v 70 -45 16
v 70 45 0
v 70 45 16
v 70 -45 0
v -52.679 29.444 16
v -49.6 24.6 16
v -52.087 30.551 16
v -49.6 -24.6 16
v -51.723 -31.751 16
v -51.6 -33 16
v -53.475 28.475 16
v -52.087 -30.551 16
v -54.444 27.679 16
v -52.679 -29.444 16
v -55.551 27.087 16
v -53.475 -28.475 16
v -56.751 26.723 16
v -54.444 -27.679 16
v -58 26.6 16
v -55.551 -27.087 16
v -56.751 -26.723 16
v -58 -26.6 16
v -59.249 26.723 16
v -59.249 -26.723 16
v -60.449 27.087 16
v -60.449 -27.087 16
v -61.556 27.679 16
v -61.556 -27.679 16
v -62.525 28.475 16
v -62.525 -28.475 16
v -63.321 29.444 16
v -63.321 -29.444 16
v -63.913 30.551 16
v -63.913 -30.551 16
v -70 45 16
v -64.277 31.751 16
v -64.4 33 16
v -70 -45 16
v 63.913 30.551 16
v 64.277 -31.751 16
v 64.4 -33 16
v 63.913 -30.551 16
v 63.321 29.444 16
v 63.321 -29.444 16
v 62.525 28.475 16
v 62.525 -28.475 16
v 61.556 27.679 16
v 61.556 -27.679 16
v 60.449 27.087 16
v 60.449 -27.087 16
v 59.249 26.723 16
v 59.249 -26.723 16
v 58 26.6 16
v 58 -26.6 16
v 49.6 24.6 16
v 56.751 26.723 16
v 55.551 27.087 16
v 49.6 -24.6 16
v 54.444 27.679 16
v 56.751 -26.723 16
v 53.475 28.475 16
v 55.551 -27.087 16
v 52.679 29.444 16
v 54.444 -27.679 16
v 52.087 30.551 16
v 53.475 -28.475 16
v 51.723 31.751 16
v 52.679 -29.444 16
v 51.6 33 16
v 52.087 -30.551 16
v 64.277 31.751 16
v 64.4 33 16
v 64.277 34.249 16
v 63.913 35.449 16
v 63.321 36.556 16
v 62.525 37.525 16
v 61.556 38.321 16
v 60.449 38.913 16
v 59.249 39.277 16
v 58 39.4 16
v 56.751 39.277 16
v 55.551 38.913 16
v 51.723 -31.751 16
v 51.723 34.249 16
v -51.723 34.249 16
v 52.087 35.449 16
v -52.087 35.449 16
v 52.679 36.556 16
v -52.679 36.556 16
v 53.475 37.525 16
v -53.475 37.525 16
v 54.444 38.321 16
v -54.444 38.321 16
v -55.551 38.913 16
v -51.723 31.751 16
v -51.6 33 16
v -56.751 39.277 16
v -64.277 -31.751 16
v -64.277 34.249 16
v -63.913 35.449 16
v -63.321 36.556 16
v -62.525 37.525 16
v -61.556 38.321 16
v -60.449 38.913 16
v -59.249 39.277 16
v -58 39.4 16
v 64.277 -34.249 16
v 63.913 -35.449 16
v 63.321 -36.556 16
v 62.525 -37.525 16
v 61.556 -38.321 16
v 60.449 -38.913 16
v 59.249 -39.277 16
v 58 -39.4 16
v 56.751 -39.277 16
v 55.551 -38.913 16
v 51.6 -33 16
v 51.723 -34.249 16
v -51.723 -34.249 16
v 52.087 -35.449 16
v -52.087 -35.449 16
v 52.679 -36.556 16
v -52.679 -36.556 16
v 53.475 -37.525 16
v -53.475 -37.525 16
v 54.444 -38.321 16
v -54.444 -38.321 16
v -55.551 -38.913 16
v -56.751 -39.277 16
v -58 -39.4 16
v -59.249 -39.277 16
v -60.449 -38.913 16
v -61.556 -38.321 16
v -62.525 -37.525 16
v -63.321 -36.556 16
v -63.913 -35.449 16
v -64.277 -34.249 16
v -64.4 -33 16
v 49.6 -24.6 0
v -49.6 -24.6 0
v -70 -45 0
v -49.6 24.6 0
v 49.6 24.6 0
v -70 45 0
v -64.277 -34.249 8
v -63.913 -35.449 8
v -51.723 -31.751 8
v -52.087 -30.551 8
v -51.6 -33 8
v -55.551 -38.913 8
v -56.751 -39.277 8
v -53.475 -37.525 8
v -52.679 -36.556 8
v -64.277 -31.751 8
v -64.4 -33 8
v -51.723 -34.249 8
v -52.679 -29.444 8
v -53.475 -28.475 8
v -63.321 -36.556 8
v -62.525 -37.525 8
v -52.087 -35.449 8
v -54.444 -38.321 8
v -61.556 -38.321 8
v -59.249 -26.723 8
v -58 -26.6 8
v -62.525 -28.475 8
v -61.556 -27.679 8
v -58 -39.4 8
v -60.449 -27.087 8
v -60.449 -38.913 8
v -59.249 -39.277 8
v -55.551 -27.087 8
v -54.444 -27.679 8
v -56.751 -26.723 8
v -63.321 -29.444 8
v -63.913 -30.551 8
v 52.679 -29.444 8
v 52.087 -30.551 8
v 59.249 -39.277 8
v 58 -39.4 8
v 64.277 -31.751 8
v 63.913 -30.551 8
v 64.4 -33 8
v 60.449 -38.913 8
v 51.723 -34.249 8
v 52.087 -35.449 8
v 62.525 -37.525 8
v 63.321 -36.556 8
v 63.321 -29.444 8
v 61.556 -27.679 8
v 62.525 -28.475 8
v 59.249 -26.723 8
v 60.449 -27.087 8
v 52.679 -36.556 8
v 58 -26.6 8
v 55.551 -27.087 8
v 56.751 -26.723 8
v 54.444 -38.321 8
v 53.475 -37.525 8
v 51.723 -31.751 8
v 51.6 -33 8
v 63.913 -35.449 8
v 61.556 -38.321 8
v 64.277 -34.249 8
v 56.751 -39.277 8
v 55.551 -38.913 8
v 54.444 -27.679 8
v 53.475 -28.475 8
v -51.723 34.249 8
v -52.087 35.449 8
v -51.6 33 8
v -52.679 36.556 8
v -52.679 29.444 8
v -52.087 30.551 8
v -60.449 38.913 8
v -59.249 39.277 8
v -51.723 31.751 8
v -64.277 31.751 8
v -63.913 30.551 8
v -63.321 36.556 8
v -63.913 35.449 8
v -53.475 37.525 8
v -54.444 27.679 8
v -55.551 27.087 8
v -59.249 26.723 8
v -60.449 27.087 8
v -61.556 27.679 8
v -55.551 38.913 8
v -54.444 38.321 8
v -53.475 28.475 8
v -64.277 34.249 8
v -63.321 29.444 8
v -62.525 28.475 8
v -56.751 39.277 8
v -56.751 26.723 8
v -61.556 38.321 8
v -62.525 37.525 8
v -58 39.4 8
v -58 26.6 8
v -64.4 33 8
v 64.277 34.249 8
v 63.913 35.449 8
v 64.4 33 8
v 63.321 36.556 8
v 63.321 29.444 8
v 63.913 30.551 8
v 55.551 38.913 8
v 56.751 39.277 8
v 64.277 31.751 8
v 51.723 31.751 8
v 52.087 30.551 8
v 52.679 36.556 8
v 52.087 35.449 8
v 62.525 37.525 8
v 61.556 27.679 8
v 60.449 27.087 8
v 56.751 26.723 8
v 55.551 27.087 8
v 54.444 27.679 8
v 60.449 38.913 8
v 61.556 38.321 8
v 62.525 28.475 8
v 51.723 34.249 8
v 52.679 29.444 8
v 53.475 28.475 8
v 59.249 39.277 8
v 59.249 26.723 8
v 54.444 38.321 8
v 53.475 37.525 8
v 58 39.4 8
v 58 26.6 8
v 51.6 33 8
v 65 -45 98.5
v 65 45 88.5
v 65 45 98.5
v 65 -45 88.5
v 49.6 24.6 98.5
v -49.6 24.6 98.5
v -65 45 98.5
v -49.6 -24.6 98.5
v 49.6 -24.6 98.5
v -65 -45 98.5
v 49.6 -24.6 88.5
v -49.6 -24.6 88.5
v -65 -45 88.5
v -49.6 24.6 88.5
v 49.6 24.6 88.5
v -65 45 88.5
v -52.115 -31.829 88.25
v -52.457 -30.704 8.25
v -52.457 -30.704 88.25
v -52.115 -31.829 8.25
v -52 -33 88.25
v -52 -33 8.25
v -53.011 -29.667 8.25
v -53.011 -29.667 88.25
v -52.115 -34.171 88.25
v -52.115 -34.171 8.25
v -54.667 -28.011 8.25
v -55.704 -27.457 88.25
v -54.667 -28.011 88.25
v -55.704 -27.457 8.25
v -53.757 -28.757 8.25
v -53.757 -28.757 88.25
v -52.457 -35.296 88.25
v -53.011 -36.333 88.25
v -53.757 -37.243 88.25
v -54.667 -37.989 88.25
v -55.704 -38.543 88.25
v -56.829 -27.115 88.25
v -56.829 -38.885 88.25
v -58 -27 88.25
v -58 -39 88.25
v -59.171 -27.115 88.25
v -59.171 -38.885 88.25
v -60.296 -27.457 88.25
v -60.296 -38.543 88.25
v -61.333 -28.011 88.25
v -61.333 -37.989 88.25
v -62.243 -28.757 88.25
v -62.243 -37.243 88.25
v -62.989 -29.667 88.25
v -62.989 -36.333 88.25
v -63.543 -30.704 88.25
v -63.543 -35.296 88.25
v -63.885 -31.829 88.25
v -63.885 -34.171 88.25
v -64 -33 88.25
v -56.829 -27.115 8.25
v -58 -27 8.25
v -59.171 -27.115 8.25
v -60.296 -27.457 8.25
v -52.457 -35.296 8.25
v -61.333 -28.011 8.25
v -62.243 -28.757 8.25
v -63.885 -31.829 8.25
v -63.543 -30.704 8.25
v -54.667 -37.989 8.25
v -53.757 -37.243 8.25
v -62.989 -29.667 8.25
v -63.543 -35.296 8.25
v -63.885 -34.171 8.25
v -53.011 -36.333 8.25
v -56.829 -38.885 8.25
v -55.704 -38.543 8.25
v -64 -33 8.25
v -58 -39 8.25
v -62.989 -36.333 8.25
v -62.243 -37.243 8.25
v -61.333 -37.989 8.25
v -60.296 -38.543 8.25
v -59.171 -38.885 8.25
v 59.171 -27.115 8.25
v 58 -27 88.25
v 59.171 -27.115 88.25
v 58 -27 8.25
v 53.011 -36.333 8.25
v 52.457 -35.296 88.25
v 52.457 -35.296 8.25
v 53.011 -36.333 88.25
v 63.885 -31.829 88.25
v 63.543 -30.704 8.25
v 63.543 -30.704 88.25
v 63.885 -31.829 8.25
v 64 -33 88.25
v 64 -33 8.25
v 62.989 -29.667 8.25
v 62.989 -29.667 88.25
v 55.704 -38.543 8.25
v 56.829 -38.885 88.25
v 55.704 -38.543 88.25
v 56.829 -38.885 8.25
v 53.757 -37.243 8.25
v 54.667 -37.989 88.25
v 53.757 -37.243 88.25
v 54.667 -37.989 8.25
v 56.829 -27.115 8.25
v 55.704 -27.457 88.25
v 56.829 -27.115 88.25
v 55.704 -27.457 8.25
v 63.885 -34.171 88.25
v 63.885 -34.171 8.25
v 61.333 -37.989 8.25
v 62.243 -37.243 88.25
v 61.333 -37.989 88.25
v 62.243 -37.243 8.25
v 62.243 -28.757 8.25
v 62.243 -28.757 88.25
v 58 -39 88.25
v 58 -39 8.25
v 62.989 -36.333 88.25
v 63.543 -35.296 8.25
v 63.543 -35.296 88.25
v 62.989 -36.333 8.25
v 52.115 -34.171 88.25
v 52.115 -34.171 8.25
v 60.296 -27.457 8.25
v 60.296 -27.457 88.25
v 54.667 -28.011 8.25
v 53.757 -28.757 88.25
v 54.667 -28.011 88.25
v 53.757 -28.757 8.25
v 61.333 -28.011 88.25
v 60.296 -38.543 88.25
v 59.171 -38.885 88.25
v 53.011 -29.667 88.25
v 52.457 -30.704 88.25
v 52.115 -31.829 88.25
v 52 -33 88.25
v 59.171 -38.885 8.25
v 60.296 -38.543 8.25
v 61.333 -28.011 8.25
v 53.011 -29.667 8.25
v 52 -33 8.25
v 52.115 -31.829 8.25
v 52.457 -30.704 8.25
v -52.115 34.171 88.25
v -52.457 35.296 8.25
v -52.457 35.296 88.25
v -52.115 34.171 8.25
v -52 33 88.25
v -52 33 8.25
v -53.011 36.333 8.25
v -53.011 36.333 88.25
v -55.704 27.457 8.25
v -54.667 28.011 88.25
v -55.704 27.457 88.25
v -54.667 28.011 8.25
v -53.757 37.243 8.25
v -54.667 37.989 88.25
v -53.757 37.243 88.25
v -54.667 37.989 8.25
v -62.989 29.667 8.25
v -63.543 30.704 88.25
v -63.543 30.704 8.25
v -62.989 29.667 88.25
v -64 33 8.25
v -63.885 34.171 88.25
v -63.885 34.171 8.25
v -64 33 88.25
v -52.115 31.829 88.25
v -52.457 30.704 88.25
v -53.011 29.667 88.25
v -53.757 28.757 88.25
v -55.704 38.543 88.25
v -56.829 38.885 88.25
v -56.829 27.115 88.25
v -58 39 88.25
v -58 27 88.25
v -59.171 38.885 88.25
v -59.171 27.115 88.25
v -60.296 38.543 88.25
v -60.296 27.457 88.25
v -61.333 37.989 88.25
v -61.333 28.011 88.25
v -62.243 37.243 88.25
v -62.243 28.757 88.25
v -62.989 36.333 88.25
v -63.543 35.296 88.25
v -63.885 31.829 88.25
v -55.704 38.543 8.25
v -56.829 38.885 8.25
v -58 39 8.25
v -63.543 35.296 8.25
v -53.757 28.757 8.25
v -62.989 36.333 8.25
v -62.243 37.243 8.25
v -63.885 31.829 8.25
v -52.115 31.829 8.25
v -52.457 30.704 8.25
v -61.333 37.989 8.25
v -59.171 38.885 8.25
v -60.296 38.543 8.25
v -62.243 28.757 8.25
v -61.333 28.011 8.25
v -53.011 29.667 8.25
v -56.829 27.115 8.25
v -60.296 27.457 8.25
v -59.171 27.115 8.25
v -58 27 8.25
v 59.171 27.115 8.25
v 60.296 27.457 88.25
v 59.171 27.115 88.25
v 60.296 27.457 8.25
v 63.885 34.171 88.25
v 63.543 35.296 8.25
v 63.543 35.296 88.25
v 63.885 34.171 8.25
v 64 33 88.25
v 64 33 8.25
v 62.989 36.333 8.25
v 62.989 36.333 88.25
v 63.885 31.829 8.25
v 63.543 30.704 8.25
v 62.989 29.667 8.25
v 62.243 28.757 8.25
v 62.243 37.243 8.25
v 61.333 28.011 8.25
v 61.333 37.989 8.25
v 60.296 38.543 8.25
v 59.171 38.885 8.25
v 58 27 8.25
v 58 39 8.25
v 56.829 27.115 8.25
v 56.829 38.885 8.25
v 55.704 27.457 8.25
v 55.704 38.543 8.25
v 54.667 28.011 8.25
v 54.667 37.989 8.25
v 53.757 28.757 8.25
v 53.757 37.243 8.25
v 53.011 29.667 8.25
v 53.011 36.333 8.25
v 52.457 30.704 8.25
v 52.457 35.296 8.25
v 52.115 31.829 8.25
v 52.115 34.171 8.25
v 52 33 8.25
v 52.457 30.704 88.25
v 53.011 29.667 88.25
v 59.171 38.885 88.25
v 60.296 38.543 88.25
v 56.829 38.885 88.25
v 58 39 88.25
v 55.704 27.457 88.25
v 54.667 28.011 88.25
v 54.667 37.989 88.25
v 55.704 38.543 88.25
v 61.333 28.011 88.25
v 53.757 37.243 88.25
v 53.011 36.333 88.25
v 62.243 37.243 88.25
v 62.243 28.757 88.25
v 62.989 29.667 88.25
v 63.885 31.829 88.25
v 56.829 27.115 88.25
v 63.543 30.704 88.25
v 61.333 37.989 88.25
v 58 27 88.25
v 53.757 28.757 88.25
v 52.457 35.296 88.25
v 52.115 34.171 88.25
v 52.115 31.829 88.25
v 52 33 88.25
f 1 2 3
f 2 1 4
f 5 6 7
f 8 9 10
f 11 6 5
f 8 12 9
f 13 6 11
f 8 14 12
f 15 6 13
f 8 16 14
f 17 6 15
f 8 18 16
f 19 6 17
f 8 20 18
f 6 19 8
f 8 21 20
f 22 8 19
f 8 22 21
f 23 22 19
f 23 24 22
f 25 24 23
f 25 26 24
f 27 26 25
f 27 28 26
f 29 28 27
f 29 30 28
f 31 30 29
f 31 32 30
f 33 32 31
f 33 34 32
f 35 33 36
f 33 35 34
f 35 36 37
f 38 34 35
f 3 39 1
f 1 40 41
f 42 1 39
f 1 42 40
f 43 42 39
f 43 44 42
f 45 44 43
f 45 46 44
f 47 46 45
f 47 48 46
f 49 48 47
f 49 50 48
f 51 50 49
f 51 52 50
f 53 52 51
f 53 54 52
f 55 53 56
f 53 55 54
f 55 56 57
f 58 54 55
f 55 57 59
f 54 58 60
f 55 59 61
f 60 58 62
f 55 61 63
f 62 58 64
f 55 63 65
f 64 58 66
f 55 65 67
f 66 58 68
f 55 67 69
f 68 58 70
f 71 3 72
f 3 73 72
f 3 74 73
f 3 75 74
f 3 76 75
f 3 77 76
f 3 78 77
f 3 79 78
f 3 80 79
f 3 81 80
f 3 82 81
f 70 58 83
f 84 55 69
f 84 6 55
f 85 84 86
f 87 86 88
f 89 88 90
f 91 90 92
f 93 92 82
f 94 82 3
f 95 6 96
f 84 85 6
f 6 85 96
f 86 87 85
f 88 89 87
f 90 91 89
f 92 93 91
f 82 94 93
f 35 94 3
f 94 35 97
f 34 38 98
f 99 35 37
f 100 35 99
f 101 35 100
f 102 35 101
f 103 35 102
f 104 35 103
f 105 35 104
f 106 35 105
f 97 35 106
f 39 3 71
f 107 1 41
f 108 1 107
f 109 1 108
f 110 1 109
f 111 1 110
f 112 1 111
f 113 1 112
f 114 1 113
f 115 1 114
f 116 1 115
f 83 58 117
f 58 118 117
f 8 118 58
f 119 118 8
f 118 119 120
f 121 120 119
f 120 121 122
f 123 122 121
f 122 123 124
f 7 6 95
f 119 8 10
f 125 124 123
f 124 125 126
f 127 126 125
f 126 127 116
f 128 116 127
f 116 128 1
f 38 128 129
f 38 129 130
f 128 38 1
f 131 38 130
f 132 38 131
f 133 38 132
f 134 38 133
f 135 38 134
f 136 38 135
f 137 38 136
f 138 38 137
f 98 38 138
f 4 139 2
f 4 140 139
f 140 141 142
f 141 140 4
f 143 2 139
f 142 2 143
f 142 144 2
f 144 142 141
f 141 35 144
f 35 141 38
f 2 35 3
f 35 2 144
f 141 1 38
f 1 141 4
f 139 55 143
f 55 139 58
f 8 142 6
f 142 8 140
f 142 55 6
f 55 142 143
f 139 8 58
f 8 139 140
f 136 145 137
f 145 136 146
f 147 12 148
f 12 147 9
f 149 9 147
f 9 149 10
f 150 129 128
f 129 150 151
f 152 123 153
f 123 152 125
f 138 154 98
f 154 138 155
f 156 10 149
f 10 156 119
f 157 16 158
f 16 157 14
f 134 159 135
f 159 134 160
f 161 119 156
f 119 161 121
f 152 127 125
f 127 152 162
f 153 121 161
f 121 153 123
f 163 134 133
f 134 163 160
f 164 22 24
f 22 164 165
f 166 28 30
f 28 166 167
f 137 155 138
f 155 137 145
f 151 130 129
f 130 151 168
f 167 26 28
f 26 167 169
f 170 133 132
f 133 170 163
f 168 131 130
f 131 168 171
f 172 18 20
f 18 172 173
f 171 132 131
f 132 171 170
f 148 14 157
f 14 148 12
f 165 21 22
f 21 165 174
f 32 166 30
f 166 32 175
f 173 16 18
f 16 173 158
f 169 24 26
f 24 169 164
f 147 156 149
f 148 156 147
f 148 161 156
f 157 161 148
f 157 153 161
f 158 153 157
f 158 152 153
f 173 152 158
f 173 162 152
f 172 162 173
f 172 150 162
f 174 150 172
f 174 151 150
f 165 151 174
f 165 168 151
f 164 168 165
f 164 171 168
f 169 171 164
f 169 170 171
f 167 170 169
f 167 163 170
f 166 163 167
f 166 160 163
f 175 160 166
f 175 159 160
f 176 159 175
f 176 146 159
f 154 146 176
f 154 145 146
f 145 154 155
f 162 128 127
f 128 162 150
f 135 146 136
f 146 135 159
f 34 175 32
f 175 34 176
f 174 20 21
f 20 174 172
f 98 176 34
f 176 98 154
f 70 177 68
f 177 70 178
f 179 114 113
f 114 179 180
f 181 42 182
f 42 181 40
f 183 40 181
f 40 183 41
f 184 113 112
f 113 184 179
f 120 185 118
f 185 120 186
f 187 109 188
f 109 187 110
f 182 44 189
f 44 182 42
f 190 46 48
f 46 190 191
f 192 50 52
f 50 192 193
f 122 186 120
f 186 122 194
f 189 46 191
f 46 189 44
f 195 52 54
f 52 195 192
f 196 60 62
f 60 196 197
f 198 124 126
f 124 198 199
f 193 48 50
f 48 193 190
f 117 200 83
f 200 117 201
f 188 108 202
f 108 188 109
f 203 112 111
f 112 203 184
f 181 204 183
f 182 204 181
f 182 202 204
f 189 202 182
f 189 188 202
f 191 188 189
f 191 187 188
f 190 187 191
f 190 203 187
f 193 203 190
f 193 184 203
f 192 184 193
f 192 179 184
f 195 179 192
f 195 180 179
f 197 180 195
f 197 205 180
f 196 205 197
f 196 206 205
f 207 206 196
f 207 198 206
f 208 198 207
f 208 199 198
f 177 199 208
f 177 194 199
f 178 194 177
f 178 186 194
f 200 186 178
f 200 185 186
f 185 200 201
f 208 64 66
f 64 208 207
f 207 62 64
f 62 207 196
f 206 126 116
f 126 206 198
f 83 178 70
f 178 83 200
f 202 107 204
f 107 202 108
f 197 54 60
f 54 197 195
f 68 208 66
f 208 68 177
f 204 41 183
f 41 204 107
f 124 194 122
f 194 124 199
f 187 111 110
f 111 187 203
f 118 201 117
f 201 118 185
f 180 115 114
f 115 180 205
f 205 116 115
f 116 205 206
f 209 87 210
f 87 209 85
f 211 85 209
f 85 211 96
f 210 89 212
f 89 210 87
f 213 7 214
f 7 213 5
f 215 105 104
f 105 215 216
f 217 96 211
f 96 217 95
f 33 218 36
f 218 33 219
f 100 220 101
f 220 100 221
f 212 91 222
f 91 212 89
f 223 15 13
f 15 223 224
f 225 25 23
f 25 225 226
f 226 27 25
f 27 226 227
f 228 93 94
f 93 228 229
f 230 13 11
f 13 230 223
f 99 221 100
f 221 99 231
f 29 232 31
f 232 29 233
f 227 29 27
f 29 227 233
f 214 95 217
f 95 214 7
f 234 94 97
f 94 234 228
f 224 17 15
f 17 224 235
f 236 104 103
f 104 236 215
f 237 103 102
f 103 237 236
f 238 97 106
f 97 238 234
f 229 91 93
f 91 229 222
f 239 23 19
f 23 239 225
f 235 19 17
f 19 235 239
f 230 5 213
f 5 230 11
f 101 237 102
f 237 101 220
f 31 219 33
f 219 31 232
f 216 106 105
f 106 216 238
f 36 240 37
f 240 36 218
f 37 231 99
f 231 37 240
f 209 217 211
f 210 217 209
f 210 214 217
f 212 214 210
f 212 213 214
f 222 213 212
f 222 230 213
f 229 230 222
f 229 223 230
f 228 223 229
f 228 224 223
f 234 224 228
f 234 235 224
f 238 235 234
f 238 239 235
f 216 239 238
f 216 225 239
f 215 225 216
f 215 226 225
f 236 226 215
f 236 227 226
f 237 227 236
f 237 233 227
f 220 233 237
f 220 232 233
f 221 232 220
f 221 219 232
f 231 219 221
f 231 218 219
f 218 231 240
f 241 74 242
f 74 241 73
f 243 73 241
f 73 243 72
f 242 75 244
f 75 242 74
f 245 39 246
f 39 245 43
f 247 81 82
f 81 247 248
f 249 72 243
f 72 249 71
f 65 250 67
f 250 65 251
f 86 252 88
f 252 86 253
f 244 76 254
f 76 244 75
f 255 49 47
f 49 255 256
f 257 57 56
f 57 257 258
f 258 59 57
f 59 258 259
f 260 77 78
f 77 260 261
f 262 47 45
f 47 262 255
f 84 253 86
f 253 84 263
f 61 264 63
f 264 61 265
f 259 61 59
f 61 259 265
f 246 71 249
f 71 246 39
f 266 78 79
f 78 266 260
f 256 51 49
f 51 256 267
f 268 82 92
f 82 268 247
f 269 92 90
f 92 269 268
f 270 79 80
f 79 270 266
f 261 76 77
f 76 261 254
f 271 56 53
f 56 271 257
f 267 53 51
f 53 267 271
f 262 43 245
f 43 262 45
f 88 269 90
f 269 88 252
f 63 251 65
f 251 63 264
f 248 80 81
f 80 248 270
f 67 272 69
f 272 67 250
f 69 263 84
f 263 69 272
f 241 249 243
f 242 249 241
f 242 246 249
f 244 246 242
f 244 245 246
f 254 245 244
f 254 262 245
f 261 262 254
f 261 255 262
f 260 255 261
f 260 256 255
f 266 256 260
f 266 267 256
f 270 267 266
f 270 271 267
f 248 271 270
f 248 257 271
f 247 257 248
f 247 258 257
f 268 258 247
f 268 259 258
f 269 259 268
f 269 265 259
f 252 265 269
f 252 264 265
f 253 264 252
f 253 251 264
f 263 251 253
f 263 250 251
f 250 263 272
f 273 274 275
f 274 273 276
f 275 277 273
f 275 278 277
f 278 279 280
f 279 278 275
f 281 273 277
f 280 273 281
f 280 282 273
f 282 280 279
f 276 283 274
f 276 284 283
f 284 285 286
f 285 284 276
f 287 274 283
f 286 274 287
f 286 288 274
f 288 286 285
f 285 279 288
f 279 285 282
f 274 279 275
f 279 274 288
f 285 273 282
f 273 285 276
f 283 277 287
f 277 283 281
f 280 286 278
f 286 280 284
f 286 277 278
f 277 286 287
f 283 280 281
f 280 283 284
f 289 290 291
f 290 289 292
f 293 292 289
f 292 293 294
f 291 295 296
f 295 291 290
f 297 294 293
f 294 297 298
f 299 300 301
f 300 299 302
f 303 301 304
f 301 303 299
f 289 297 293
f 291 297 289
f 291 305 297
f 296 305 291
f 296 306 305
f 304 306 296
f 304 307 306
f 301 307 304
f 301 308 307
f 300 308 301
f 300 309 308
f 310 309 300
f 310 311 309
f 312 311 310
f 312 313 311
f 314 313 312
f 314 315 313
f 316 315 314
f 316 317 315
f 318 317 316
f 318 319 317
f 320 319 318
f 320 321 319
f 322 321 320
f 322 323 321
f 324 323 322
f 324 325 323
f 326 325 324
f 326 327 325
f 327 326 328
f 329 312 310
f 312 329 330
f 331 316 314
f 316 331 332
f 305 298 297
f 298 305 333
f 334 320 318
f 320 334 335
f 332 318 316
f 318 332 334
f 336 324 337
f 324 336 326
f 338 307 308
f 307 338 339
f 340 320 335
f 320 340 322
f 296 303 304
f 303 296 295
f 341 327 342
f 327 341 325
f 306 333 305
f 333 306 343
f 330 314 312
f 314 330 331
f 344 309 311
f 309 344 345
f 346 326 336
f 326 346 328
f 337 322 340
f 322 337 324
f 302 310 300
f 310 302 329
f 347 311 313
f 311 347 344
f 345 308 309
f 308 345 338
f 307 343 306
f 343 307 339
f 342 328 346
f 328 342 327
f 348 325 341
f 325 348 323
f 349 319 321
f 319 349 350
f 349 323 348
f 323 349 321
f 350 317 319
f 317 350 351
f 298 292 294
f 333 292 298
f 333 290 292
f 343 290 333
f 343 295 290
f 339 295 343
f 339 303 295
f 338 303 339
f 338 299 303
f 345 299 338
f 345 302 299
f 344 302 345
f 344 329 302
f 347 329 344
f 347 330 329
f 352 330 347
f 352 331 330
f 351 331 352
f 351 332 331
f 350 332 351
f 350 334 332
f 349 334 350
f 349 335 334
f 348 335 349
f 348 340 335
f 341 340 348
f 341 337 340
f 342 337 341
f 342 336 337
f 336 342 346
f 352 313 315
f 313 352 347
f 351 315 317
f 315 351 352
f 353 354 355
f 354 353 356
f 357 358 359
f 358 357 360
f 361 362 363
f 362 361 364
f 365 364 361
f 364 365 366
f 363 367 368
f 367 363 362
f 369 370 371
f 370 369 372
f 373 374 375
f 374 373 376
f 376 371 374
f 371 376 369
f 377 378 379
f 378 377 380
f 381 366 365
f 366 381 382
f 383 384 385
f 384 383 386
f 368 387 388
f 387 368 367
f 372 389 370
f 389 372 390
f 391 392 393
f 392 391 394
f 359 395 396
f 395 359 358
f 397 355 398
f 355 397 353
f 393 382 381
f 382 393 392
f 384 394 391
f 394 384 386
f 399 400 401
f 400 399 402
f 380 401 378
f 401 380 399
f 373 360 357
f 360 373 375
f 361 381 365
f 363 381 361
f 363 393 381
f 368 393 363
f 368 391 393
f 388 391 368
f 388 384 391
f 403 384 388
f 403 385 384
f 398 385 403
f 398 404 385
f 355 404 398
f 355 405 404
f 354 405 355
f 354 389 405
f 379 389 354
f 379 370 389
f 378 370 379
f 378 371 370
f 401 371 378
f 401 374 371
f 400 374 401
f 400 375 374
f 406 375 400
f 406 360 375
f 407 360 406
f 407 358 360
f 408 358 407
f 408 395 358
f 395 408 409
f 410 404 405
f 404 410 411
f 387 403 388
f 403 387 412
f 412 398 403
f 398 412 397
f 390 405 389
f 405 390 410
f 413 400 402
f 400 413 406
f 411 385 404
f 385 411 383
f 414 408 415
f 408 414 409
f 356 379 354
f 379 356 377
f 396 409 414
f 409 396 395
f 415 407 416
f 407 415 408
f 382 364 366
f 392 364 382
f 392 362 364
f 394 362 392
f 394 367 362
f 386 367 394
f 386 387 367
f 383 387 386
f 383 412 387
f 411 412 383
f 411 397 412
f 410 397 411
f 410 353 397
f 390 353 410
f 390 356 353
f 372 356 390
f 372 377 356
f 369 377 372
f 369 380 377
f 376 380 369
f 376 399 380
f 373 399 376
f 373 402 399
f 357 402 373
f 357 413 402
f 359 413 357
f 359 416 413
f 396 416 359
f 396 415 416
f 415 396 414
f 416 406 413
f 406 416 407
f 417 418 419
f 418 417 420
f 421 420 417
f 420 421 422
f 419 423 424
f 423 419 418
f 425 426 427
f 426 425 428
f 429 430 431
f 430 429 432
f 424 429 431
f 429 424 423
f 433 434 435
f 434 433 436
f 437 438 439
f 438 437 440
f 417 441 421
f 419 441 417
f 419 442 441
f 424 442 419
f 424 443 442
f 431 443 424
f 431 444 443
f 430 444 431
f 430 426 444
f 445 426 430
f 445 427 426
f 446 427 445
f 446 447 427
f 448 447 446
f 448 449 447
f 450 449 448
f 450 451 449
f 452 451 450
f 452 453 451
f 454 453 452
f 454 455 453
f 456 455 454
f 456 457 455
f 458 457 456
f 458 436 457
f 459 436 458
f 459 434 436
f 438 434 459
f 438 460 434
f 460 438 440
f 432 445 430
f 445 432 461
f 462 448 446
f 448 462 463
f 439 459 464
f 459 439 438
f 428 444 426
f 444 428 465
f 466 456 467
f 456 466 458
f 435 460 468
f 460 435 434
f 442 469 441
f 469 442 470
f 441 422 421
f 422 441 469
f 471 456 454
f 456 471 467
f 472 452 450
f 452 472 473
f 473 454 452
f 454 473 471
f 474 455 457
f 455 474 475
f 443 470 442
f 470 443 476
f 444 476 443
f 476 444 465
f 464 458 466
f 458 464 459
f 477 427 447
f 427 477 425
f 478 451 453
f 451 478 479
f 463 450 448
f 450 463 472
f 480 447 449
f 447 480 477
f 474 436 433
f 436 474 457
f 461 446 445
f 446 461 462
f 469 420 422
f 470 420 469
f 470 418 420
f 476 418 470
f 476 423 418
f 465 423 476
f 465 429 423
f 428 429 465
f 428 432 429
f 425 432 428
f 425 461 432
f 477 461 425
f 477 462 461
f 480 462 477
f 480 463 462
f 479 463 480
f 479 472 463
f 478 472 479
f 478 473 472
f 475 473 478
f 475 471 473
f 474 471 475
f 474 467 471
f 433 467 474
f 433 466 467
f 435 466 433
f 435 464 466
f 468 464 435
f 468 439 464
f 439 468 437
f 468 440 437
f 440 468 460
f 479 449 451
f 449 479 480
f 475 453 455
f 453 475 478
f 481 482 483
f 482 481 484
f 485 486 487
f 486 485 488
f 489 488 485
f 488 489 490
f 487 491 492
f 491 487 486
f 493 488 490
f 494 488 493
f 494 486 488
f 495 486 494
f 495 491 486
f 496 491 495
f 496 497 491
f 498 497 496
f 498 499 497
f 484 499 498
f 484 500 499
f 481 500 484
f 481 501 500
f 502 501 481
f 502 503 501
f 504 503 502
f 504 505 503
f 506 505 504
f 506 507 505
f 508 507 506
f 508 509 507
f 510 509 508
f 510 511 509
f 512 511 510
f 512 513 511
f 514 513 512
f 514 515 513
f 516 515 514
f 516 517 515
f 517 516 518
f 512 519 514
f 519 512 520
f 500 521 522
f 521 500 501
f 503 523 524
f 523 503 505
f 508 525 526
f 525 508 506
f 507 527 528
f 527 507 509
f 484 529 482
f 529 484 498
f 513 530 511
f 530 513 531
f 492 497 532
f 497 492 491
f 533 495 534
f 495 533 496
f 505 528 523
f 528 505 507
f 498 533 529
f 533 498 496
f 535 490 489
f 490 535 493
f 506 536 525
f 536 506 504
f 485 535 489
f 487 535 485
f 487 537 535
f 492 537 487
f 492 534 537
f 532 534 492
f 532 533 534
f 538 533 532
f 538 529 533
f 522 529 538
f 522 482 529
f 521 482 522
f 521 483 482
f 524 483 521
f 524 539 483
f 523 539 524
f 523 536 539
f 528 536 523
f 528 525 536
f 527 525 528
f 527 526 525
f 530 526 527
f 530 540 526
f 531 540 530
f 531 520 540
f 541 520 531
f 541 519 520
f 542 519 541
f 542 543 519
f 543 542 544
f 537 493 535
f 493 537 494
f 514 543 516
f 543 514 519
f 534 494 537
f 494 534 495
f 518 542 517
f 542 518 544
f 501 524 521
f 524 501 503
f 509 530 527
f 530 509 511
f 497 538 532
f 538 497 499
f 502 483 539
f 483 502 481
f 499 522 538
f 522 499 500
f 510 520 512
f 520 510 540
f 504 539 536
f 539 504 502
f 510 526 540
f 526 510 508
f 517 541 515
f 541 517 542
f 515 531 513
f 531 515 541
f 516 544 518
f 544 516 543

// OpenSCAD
$fn = 32;

// ------------------------------------------------------------------------
// Frame cube: base 140 x 90 mm, posts 80 mm tall
// Every part is its own module, assembly() places every instance.
// ------------------------------------------------------------------------

// --- part 1 ---
module base_frame() {
  difference() {
    translate([-70, -45, 0]) cube([140, 90, 16]);
    translate([-49.6, -24.6, -1]) cube([99.2, 49.2, 18]);
    translate([-58, -33, 8]) cylinder(h = 9, d = 12.8);
    translate([58, -33, 8]) cylinder(h = 9, d = 12.8);
    translate([-58, 33, 8]) cylinder(h = 9, d = 12.8);
    translate([58, 33, 8]) cylinder(h = 9, d = 12.8);
  }
}

// --- part 2 ---
module corner_post() {
  cylinder(h = 80, d = 12);
}

// --- part 3 ---
module top_frame() {
  difference() {
    translate([-65, -45, 0]) cube([130, 90, 10]);
    translate([-49.6, -24.6, -1]) cube([99.2, 49.2, 12]);
  }
}

// --- assembly ---
module assembly() {
  color([0.80, 0.24, 0.20]) translate([0, 0, 0]) rotate([0, 0, 0]) base_frame();
  color([0.20, 0.45, 0.75]) translate([-58, -33, 8.25]) rotate([0, 0, 0]) corner_post();
  color([0.25, 0.62, 0.32]) translate([58, -33, 8.25]) rotate([0, 0, 0]) corner_post();
  color([0.92, 0.70, 0.18]) translate([-58, 33, 8.25]) rotate([0, 0, 0]) corner_post();
  color([0.58, 0.35, 0.70]) translate([58, 33, 8.25]) rotate([0, 0, 0]) corner_post();
  color([0.16, 0.66, 0.66]) translate([0, 0, 88.5]) rotate([0, 0, 0]) top_frame();
}

assembly();
